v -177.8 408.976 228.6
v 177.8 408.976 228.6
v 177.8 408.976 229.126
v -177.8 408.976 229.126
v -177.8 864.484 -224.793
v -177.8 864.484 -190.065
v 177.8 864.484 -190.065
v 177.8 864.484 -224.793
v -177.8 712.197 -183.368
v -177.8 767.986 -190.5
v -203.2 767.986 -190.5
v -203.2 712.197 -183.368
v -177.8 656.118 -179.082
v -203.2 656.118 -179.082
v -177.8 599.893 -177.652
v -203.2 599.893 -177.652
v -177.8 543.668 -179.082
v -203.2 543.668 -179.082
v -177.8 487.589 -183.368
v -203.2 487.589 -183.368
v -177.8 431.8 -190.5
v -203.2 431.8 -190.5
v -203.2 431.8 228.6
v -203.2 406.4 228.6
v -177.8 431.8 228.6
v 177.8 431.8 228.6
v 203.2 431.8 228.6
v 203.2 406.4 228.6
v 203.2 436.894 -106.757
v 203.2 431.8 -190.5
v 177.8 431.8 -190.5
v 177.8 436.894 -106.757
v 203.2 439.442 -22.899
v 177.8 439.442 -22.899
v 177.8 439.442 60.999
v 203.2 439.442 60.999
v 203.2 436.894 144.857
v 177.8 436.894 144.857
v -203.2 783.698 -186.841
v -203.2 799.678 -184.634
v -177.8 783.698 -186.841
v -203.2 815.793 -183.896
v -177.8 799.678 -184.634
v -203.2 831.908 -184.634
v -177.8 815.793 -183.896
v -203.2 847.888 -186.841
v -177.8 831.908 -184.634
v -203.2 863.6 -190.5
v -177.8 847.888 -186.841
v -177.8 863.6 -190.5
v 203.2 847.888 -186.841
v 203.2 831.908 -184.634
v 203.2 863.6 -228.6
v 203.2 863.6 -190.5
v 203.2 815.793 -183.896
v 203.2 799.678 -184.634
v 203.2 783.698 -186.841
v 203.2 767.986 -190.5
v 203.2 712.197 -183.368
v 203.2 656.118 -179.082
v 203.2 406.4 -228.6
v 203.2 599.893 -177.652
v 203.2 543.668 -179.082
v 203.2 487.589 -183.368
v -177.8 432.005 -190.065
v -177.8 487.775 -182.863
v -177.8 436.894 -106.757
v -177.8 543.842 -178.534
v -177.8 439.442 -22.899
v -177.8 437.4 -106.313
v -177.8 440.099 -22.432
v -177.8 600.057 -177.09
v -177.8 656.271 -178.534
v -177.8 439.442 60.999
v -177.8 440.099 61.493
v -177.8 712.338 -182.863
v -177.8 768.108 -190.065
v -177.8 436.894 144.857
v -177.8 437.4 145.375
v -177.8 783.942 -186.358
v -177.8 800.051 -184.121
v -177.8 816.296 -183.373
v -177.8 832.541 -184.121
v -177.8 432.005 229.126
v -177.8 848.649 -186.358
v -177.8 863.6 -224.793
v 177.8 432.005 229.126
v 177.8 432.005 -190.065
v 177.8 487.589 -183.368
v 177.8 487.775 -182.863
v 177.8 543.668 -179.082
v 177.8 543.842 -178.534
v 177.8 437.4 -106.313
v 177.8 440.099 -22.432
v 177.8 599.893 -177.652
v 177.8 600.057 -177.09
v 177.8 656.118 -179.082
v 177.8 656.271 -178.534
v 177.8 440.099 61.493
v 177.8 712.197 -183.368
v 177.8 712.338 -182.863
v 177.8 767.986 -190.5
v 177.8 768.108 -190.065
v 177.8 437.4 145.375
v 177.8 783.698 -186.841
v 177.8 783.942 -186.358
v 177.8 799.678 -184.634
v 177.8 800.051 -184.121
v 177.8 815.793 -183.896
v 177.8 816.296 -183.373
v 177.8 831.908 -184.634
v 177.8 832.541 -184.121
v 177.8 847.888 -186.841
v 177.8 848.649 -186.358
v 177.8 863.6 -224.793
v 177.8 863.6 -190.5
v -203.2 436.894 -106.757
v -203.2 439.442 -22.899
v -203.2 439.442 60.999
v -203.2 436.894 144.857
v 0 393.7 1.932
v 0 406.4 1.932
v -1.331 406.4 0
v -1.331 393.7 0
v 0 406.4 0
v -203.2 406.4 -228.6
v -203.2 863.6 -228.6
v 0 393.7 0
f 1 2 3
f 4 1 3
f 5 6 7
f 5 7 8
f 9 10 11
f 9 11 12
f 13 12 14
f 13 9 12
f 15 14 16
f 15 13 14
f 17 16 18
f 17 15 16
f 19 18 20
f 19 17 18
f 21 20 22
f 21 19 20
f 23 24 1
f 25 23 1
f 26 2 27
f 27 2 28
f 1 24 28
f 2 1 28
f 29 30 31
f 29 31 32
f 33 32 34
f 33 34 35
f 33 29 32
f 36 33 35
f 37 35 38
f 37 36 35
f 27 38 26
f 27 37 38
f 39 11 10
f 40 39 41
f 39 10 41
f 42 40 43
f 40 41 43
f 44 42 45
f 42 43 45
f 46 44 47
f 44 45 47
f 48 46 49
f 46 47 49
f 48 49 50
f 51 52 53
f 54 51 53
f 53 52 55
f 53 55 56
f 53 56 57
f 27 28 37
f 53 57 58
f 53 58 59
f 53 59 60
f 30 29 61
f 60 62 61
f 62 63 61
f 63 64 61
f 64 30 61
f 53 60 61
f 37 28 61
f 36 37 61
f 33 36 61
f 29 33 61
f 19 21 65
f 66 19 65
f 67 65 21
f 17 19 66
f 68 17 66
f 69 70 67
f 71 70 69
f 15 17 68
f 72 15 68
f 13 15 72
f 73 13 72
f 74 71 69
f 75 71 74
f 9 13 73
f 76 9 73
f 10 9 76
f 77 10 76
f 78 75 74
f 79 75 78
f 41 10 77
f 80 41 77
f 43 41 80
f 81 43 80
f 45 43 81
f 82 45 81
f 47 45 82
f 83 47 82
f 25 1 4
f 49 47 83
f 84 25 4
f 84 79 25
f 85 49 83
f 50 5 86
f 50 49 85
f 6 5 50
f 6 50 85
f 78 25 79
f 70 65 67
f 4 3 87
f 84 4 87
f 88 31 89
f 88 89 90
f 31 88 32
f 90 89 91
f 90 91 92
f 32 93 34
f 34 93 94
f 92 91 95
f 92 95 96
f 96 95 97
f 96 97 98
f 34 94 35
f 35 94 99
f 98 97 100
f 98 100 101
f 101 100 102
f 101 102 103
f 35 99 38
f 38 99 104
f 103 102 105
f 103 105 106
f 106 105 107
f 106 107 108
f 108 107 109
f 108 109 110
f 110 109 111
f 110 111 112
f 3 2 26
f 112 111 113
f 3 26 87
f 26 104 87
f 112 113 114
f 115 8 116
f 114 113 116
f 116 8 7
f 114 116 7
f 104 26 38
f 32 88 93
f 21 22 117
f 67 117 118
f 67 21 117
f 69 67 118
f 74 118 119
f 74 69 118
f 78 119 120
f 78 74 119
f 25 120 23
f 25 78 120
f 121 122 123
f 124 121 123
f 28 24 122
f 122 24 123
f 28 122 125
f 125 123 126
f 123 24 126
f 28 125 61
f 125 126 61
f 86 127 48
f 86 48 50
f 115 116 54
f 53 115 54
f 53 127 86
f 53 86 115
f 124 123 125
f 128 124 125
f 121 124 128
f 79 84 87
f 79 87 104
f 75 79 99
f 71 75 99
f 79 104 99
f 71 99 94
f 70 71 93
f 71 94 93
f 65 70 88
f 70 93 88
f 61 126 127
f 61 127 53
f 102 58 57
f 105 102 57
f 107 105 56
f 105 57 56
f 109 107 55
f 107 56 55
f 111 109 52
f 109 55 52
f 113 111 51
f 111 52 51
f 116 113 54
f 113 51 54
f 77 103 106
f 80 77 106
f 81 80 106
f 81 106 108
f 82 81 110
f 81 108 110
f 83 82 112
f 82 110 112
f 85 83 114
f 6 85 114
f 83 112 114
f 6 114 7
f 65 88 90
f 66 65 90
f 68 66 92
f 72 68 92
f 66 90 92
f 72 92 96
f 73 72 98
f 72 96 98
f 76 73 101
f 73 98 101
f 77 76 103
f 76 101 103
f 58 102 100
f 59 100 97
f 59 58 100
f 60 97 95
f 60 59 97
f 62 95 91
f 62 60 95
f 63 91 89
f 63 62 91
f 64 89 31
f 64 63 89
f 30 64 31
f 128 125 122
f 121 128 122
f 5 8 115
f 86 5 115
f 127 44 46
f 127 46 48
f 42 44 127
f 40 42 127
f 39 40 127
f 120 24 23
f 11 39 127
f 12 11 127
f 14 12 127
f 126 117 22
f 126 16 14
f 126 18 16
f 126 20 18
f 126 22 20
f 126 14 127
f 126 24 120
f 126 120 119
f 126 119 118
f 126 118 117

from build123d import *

# Parameters (mm, degrees)
BOSS_EXTRUDE1_START  = 406.4
SKETCH2_W            = 406.4
SKETCH2_H            = 457.2
BOSS_EXTRUDE1_DEPTH  = 25.4
SKETCH5_W            = 406.4
SKETCH5_H            = 38.1
BOSS_EXTRUDE2_DEPTH  = 431.8
BOSS_EXTRUDE3_DEPTH  = 406.4
BOSS_EXTRUDE5_DEPTH  = 406.4
BOSS_EXTRUDE6_DEPTH  = 406.4
BOSS_EXTRUDE8_START  = -25.4
BOSS_EXTRUDE8_DEPTH  = 355.6
BOSS_EXTRUDE10_DEPTH = 12.7


with BuildPart() as part:
    # Sketch2 → Boss-Extrude1 (new body)
    with BuildSketch(Plane(origin=(0, 0, 0), x_dir=(1, 0, 0), z_dir=(0, 1, 0)).offset(BOSS_EXTRUDE1_START)):
        Rectangle(SKETCH2_W, SKETCH2_H)
    extrude(amount=BOSS_EXTRUDE1_DEPTH)

    # Sketch5 → Boss-Extrude2 (add)
    with BuildSketch(Plane(origin=(0, 431.8, 0), x_dir=(1, 0, 0), z_dir=(0, 1, 0))):
        with Locations((0, 209.55)):
            Rectangle(SKETCH5_W, SKETCH5_H)
    extrude(amount=BOSS_EXTRUDE2_DEPTH)

    # Sketch6 → Boss-Extrude3 (add)
    with BuildSketch(Plane(origin=(203.2, 0, 0), x_dir=(0, 0, -1), z_dir=(1, 0, 0))):
        with BuildLine():
            Line((190.5, 431.8), (228.6, 431.8))
            Line((228.6, 431.8), (228.6, 863.6))
            Line((228.6, 863.6), (209.55, 863.6))
            ThreePointArc((209.55, 863.6), (178.726471845, 648.639640948), (190.5, 431.8))
        make_face()
    extrude(amount=-BOSS_EXTRUDE3_DEPTH)

    # Sketch7 → Boss-Extrude5 (add)
    with BuildSketch(Plane(origin=(203.2, 0, 0), x_dir=(0, 0, -1), z_dir=(1, 0, 0))):
        with BuildLine():
            Line((-228.6, 431.8), (-228.6, 406.4))
            Line((-228.6, 406.4), (190.5, 406.4))
            Line((190.5, 406.4), (190.5, 431.8))
            ThreePointArc((190.5, 431.8), (-19.05, 439.760210116), (-228.6, 431.8))
        make_face()
    extrude(amount=-BOSS_EXTRUDE5_DEPTH)

    # Sketch8 → Boss-Extrude6 (add)
    with BuildSketch(Plane(origin=(203.2, 0, 0), x_dir=(0, 0, -1), z_dir=(1, 0, 0))):
        with BuildLine():
            Line((190.5, 863.6), (228.6, 863.6))
            Line((228.6, 863.6), (228.6, 767.986138045))
            Line((228.6, 767.986138045), (190.5, 767.986138045))
            ThreePointArc((190.5, 767.986138045), (183.89577559, 815.793069023), (190.5, 863.6))
        make_face()
    extrude(amount=-BOSS_EXTRUDE6_DEPTH)

    # Sketch9 → Boss-Extrude8 (add)
    with BuildSketch(Plane(origin=(203.2, 0, 0), x_dir=(0, 0, -1), z_dir=(1, 0, 0)).offset(BOSS_EXTRUDE8_START)):
        with BuildLine():
            Line((190.064521118, 864.483944692), (224.793246745, 864.483944692))
            Line((224.793246745, 864.483944692), (224.793246745, 863.6))
            Line((224.793246745, 863.6), (224.793246745, 408.97647982))
            Line((224.793246745, 408.97647982), (-229.126005902, 408.97647982))
            Line((-229.126005902, 408.97647982), (-229.126005902, 432.005066032))
            ThreePointArc((-229.126005902, 432.005066032), (-19.530742392, 440.435933777), (190.064521118, 432.005066032))
            ThreePointArc((190.064521118, 432.005066032), (177.09008034, 600.056508721), (190.064521118, 768.10795141))
            ThreePointArc((190.064521118, 768.10795141), (183.373440165, 816.295948051), (190.064521118, 864.483944692))
        make_face()
    extrude(amount=-BOSS_EXTRUDE8_DEPTH)

    # Sketch11 → Boss-Extrude10 (add)
    with BuildSketch(Plane.XZ.offset(-406.4)):
        Polygon((0, 0), (0, 1.931960206), (-1.331020628, 0), align=None)
    extrude(amount=BOSS_EXTRUDE10_DEPTH)


solid = part.part
